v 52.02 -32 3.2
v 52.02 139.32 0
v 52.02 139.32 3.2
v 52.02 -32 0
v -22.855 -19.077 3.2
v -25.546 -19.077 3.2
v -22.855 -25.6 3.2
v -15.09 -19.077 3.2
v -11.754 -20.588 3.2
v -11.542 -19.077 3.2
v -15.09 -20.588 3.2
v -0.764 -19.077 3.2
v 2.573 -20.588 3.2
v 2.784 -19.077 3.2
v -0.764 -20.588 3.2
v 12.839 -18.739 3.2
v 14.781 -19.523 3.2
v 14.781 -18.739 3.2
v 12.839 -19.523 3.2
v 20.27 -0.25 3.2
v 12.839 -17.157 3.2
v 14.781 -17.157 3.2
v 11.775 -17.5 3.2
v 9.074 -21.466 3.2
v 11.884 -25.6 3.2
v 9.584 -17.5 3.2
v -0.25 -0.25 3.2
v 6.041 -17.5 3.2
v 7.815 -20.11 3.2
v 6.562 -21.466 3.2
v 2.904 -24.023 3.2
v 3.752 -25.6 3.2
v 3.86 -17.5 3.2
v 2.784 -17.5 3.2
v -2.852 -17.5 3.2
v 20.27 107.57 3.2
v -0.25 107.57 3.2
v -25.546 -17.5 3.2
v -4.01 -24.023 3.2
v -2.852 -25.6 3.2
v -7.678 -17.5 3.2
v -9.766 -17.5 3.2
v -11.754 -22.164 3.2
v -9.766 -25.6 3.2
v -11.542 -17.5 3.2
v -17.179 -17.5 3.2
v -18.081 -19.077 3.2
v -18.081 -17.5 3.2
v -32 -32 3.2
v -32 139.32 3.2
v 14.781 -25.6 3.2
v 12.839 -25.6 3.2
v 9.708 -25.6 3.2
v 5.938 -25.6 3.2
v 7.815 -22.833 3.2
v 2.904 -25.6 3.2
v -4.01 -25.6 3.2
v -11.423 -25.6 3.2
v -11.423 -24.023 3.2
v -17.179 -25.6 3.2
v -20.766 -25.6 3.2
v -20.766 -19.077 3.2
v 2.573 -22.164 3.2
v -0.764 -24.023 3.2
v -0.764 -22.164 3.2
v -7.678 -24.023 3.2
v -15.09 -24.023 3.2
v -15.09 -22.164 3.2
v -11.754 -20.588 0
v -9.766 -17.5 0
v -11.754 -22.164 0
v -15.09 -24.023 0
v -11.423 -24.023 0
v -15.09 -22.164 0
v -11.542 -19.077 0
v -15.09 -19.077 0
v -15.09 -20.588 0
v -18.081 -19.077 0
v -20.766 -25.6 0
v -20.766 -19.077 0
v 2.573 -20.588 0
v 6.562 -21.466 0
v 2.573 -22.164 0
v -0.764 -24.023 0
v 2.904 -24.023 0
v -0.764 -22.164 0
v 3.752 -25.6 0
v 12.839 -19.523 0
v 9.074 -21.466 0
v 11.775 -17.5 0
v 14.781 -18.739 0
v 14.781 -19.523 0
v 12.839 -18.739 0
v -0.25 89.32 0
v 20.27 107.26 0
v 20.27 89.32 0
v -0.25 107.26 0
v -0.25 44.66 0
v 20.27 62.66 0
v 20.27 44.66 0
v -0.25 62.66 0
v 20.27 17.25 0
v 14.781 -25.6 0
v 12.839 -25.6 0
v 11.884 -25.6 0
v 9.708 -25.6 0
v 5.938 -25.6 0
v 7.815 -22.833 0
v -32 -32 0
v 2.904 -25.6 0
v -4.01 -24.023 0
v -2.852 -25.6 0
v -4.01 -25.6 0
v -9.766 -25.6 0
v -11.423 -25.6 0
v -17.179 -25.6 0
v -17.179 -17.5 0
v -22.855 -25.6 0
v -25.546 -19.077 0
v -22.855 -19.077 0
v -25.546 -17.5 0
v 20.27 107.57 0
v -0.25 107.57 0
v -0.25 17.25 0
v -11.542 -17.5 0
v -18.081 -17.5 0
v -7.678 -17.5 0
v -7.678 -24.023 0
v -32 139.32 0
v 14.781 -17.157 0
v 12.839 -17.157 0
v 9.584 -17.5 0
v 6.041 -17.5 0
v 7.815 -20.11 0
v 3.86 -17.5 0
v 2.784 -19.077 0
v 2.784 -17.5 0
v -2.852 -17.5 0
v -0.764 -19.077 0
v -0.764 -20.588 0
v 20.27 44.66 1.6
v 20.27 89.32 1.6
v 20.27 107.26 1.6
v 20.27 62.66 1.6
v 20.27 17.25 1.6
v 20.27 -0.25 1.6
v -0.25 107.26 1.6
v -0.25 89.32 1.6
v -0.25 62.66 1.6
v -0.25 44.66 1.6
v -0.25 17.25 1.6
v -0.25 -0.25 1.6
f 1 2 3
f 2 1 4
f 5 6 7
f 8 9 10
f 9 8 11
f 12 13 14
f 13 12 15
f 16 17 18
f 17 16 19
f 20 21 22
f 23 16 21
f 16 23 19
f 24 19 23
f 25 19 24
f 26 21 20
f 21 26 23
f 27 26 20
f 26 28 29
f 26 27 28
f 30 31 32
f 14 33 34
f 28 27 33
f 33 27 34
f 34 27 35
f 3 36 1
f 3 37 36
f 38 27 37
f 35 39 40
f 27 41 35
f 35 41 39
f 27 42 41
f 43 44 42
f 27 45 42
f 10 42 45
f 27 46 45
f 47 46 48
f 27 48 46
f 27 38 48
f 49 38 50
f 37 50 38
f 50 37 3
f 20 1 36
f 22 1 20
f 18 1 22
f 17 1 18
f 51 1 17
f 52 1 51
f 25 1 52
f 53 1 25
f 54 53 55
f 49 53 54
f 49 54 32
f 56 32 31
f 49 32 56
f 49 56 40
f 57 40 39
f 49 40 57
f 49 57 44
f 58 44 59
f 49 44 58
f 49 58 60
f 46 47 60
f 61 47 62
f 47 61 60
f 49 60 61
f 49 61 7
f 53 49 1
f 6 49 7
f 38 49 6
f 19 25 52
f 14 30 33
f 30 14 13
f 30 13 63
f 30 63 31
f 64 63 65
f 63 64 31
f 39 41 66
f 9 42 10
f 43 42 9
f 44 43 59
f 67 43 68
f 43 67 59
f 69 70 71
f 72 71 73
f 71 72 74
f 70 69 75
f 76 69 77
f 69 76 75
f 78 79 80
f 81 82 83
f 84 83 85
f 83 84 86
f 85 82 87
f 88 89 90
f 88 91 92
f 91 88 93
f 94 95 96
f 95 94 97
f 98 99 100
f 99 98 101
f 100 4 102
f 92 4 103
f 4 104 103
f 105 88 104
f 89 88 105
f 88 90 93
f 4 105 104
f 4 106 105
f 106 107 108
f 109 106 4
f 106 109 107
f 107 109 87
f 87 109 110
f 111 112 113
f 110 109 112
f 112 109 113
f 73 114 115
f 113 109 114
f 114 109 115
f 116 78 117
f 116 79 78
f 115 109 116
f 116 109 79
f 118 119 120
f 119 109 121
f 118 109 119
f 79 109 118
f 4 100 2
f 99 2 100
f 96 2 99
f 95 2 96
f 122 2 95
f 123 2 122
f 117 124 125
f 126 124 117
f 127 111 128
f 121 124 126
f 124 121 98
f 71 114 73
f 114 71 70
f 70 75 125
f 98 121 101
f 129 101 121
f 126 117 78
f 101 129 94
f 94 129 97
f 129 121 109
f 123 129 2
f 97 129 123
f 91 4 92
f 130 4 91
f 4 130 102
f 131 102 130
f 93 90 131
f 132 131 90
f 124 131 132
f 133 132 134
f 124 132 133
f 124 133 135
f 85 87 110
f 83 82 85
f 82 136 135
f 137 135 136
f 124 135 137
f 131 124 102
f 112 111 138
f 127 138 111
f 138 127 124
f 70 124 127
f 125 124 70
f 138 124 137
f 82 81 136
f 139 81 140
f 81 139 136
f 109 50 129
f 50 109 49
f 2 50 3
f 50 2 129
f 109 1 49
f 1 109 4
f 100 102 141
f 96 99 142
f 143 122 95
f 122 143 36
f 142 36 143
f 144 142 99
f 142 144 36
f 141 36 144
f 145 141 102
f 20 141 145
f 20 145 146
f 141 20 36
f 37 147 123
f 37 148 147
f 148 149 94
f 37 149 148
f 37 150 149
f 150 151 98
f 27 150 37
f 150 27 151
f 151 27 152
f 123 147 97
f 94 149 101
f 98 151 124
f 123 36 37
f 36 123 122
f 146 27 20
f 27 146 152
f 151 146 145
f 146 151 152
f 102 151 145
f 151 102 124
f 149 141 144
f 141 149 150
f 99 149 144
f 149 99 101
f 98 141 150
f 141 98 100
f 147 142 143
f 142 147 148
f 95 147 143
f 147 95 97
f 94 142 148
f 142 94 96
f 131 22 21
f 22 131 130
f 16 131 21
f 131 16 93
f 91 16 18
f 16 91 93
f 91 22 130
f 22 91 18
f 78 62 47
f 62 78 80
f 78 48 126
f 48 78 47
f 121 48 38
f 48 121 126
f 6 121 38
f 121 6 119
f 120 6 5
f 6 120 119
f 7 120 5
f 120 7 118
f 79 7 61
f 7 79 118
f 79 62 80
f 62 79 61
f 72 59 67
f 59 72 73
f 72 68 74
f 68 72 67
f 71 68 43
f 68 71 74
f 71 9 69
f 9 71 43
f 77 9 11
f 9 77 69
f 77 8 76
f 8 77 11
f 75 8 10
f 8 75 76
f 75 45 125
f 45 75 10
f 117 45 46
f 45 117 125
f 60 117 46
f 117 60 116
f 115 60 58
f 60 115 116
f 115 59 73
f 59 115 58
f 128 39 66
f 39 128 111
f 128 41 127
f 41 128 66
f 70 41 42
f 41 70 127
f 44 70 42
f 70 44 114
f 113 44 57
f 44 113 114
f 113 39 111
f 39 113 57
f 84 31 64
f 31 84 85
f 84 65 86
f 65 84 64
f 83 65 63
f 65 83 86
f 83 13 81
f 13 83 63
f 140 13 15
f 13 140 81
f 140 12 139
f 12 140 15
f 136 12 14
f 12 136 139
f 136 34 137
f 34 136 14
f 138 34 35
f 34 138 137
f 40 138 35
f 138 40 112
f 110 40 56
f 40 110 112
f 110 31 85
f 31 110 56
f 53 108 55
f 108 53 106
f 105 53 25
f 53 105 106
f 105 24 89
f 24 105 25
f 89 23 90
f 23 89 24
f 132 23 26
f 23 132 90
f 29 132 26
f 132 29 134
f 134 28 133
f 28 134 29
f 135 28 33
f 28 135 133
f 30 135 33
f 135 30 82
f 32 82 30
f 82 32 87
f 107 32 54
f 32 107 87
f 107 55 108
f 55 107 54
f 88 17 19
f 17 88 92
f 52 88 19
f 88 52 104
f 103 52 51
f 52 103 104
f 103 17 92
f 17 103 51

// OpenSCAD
$fn = 50;

// TXo Bottom

tolerance = .5;

pcbX = 20.02;
pcbY = 107.32;
pcbZ = 1.6;

frame = 32;

barOneStart = 0;
barOneEnd = 18;

barTwoStart = pcbY / 2 - 9;
barTwoEnd = barTwoStart + 18;

barThreeStart = pcbY - 18;
barThreeEnd = 107.01 + (tolerance / 2);

corner = 2.5;

difference(){

    union(){
        difference() {
            translate([-frame, - frame, 0])
                cube([pcbX + 2 * frame, pcbY + 2 * frame, 2 * pcbZ]);
            translate([-tolerance/2, -tolerance/2, 0])
                cube([pcbX + tolerance, pcbY + tolerance, 2 * pcbZ]);
        }

        translate([-tolerance/2, barOneStart-(tolerance/2), 0])
            cube([pcbX + tolerance, barOneEnd - barOneStart -tolerance, pcbZ]);
            
        translate([-tolerance/2, barTwoStart, 0])
            cube([pcbX + tolerance, barTwoEnd - barTwoStart, pcbZ]);
        
        translate([-tolerance/2, barThreeStart, 0])
            cube([pcbX + tolerance, barThreeEnd - barThreeStart, pcbZ]);

    }

     translate([-frame * .8, -frame * .8]) {
       linear_extrude(height = 2 * pcbZ)
        text("TELEXi", font = "Core Humanist Sans:style=Bold", size = 8);
     }
 
 }

/*

translate([-13,-frame * .74,0])
    cube([10, pcbZ * .5, pcbZ / 3]);


translate([-4,-frame * .655,0])
    cube([8, pcbZ * .4, pcbZ / 3]);
 
translate([-4,-frame * .755,0])
    cube([7, pcbZ * .4, pcbZ / 3]);

translate([3,-frame * .74,0])
    cube([7, pcbZ * .4, pcbZ / 3]);
 
translate([18,-frame * .74,0])
    cube([7, pcbZ * .4, pcbZ / 3]);
 
 */               
